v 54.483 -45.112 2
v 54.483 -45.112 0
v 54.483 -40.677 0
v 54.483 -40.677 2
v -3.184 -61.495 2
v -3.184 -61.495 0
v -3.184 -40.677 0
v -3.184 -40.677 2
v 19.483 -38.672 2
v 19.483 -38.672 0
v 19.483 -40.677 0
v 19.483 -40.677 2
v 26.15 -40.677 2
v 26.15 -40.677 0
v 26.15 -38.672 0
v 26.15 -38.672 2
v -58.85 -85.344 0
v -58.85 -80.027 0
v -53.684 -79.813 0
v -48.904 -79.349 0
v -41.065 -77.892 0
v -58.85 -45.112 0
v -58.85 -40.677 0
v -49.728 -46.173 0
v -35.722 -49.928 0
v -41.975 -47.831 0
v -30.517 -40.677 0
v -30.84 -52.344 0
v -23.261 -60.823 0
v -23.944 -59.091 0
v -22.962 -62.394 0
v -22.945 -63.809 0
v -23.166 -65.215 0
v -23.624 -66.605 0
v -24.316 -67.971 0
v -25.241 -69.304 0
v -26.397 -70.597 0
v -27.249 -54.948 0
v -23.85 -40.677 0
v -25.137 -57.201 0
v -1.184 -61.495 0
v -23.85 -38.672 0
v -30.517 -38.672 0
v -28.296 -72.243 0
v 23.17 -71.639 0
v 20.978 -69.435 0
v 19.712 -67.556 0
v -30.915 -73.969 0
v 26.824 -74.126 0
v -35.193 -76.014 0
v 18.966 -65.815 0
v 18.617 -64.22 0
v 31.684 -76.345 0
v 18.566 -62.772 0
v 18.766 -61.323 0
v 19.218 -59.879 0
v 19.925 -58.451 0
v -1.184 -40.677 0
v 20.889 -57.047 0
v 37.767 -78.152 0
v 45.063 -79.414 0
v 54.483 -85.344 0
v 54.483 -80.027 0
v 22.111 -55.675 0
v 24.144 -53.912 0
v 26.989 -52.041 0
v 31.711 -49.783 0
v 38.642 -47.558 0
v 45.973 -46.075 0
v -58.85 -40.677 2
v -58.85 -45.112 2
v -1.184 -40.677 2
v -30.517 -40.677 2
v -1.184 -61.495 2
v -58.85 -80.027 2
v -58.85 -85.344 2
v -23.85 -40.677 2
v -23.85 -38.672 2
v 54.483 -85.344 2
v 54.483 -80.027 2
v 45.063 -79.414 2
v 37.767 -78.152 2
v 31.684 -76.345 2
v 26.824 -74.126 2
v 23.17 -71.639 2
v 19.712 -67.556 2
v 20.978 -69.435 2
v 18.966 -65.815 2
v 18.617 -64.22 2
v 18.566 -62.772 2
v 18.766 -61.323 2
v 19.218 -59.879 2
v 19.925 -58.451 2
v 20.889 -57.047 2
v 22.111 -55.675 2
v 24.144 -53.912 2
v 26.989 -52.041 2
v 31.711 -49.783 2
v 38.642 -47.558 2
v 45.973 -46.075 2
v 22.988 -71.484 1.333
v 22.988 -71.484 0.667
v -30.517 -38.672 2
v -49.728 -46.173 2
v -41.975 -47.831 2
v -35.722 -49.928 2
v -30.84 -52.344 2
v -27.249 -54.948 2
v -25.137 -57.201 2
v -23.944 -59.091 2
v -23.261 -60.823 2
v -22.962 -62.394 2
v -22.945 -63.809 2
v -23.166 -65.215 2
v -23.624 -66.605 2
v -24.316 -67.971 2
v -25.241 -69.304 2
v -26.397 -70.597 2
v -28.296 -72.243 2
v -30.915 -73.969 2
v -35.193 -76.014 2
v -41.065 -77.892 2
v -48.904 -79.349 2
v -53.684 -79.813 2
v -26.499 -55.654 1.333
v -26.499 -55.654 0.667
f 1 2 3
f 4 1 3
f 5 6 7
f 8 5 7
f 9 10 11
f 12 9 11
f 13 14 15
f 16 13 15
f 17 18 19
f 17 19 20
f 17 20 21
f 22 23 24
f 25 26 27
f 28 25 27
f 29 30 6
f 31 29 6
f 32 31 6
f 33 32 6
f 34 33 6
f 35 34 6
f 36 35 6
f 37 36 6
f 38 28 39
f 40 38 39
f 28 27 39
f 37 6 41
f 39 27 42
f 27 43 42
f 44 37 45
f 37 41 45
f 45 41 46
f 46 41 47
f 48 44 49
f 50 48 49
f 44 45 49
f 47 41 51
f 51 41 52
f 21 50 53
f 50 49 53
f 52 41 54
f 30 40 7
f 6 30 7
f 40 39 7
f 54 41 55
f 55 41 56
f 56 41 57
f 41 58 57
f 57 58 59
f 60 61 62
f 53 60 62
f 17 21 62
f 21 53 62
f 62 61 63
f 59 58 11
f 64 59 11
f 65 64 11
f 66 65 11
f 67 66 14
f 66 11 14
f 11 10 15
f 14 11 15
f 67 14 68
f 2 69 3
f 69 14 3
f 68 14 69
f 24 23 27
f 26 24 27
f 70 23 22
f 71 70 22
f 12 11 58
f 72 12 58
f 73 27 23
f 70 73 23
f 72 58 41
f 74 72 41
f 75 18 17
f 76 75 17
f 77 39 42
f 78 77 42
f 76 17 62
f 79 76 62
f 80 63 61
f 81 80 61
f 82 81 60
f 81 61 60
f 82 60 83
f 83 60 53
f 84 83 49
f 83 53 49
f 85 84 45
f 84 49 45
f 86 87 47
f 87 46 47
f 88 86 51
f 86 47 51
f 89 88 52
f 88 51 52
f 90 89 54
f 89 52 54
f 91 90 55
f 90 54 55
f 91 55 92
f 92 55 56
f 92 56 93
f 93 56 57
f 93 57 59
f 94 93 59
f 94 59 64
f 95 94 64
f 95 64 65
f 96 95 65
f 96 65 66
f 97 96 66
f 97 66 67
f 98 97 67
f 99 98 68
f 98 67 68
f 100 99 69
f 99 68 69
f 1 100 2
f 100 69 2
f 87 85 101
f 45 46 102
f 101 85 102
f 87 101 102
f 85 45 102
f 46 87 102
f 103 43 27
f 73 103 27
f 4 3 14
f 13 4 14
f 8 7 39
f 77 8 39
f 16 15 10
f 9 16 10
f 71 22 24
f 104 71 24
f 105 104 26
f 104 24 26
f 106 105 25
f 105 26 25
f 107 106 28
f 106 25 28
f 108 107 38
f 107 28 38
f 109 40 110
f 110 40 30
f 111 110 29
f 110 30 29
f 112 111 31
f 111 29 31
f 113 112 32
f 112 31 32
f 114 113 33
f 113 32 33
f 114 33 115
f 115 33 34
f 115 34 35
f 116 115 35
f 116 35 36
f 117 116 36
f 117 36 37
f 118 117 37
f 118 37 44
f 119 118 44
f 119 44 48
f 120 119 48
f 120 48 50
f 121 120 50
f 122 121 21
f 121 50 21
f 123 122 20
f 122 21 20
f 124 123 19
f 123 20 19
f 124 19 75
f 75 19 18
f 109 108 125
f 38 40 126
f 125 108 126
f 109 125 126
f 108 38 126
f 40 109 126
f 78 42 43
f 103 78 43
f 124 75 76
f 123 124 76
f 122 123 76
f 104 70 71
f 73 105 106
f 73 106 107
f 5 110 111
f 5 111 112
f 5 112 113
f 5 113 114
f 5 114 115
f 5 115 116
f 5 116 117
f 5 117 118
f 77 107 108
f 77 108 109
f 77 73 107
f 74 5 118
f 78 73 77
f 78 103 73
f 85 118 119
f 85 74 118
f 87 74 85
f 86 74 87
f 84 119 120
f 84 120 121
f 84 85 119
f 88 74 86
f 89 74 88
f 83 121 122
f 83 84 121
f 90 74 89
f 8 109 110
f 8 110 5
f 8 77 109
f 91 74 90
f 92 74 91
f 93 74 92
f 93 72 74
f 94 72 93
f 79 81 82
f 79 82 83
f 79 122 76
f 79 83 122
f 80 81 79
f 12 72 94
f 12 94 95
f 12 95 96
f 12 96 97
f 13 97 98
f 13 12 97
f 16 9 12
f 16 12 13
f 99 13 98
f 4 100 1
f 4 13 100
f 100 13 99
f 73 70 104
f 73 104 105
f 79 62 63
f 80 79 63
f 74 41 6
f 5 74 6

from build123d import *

# Parameters (mm, degrees)
RESSALTO_EXTRUS_O1_DEPTH = 2


with BuildPart() as part:
    # Model → Ressalto-extrusão1 (new body)
    with BuildSketch(Plane.XY):
        with BuildLine():
            Line((-58.8502, -40.6768), (-58.8502, -45.1121))
            add(Edge.make_bspline(
                [(-58.8502, -45.1121), (-9.0376, -48.8189), (-12.8956, -79.3194), (-58.8502, -80.0274)],
                knots=[0.047619048, 0.047619048, 0.047619048, 0.047619048, 0.095238095, 0.095238095, 0.095238095, 0.095238095], degree=3))
            Line((-58.8502, -80.0274), (-58.8502, -85.3435))
            Line((-58.8502, -85.3435), (54.4831, -85.3435))
            Line((54.4831, -85.3435), (54.4831, -80.0274))
            add(Edge.make_bspline(
                [(54.4831, -80.0274), (8.5266, -79.3193), (4.6696, -48.8189), (54.4831, -45.1121)],
                knots=[0.238095238, 0.238095238, 0.238095238, 0.238095238, 0.285714286, 0.285714286, 0.285714286, 0.285714286], degree=3))
            Line((54.4831, -45.1121), (54.4831, -40.6768))
            Line((54.4831, -40.6768), (26.1498, -40.6768))
            Line((26.1498, -40.6768), (26.1498, -38.6717))
            Line((26.1498, -38.6717), (19.4831, -38.6717))
            Line((19.4831, -38.6717), (19.4831, -40.6768))
            Line((19.4831, -40.6768), (-1.1835, -40.6768))
            Line((-1.1835, -40.6768), (-1.1835, -61.4949))
            Line((-1.1835, -61.4949), (-3.1835, -61.4949))
            Line((-3.1835, -61.4949), (-3.1835, -40.6768))
            Line((-3.1835, -40.6768), (-23.8502, -40.6768))
            Line((-23.8502, -40.6768), (-23.8502, -38.6717))
            Line((-23.8502, -38.6717), (-30.5169, -38.6717))
            Line((-30.5169, -38.6717), (-30.5169, -40.6768))
            Line((-30.5169, -40.6768), (-58.8502, -40.6768))
        make_face()
    extrude(amount=RESSALTO_EXTRUS_O1_DEPTH)


solid = part.part
